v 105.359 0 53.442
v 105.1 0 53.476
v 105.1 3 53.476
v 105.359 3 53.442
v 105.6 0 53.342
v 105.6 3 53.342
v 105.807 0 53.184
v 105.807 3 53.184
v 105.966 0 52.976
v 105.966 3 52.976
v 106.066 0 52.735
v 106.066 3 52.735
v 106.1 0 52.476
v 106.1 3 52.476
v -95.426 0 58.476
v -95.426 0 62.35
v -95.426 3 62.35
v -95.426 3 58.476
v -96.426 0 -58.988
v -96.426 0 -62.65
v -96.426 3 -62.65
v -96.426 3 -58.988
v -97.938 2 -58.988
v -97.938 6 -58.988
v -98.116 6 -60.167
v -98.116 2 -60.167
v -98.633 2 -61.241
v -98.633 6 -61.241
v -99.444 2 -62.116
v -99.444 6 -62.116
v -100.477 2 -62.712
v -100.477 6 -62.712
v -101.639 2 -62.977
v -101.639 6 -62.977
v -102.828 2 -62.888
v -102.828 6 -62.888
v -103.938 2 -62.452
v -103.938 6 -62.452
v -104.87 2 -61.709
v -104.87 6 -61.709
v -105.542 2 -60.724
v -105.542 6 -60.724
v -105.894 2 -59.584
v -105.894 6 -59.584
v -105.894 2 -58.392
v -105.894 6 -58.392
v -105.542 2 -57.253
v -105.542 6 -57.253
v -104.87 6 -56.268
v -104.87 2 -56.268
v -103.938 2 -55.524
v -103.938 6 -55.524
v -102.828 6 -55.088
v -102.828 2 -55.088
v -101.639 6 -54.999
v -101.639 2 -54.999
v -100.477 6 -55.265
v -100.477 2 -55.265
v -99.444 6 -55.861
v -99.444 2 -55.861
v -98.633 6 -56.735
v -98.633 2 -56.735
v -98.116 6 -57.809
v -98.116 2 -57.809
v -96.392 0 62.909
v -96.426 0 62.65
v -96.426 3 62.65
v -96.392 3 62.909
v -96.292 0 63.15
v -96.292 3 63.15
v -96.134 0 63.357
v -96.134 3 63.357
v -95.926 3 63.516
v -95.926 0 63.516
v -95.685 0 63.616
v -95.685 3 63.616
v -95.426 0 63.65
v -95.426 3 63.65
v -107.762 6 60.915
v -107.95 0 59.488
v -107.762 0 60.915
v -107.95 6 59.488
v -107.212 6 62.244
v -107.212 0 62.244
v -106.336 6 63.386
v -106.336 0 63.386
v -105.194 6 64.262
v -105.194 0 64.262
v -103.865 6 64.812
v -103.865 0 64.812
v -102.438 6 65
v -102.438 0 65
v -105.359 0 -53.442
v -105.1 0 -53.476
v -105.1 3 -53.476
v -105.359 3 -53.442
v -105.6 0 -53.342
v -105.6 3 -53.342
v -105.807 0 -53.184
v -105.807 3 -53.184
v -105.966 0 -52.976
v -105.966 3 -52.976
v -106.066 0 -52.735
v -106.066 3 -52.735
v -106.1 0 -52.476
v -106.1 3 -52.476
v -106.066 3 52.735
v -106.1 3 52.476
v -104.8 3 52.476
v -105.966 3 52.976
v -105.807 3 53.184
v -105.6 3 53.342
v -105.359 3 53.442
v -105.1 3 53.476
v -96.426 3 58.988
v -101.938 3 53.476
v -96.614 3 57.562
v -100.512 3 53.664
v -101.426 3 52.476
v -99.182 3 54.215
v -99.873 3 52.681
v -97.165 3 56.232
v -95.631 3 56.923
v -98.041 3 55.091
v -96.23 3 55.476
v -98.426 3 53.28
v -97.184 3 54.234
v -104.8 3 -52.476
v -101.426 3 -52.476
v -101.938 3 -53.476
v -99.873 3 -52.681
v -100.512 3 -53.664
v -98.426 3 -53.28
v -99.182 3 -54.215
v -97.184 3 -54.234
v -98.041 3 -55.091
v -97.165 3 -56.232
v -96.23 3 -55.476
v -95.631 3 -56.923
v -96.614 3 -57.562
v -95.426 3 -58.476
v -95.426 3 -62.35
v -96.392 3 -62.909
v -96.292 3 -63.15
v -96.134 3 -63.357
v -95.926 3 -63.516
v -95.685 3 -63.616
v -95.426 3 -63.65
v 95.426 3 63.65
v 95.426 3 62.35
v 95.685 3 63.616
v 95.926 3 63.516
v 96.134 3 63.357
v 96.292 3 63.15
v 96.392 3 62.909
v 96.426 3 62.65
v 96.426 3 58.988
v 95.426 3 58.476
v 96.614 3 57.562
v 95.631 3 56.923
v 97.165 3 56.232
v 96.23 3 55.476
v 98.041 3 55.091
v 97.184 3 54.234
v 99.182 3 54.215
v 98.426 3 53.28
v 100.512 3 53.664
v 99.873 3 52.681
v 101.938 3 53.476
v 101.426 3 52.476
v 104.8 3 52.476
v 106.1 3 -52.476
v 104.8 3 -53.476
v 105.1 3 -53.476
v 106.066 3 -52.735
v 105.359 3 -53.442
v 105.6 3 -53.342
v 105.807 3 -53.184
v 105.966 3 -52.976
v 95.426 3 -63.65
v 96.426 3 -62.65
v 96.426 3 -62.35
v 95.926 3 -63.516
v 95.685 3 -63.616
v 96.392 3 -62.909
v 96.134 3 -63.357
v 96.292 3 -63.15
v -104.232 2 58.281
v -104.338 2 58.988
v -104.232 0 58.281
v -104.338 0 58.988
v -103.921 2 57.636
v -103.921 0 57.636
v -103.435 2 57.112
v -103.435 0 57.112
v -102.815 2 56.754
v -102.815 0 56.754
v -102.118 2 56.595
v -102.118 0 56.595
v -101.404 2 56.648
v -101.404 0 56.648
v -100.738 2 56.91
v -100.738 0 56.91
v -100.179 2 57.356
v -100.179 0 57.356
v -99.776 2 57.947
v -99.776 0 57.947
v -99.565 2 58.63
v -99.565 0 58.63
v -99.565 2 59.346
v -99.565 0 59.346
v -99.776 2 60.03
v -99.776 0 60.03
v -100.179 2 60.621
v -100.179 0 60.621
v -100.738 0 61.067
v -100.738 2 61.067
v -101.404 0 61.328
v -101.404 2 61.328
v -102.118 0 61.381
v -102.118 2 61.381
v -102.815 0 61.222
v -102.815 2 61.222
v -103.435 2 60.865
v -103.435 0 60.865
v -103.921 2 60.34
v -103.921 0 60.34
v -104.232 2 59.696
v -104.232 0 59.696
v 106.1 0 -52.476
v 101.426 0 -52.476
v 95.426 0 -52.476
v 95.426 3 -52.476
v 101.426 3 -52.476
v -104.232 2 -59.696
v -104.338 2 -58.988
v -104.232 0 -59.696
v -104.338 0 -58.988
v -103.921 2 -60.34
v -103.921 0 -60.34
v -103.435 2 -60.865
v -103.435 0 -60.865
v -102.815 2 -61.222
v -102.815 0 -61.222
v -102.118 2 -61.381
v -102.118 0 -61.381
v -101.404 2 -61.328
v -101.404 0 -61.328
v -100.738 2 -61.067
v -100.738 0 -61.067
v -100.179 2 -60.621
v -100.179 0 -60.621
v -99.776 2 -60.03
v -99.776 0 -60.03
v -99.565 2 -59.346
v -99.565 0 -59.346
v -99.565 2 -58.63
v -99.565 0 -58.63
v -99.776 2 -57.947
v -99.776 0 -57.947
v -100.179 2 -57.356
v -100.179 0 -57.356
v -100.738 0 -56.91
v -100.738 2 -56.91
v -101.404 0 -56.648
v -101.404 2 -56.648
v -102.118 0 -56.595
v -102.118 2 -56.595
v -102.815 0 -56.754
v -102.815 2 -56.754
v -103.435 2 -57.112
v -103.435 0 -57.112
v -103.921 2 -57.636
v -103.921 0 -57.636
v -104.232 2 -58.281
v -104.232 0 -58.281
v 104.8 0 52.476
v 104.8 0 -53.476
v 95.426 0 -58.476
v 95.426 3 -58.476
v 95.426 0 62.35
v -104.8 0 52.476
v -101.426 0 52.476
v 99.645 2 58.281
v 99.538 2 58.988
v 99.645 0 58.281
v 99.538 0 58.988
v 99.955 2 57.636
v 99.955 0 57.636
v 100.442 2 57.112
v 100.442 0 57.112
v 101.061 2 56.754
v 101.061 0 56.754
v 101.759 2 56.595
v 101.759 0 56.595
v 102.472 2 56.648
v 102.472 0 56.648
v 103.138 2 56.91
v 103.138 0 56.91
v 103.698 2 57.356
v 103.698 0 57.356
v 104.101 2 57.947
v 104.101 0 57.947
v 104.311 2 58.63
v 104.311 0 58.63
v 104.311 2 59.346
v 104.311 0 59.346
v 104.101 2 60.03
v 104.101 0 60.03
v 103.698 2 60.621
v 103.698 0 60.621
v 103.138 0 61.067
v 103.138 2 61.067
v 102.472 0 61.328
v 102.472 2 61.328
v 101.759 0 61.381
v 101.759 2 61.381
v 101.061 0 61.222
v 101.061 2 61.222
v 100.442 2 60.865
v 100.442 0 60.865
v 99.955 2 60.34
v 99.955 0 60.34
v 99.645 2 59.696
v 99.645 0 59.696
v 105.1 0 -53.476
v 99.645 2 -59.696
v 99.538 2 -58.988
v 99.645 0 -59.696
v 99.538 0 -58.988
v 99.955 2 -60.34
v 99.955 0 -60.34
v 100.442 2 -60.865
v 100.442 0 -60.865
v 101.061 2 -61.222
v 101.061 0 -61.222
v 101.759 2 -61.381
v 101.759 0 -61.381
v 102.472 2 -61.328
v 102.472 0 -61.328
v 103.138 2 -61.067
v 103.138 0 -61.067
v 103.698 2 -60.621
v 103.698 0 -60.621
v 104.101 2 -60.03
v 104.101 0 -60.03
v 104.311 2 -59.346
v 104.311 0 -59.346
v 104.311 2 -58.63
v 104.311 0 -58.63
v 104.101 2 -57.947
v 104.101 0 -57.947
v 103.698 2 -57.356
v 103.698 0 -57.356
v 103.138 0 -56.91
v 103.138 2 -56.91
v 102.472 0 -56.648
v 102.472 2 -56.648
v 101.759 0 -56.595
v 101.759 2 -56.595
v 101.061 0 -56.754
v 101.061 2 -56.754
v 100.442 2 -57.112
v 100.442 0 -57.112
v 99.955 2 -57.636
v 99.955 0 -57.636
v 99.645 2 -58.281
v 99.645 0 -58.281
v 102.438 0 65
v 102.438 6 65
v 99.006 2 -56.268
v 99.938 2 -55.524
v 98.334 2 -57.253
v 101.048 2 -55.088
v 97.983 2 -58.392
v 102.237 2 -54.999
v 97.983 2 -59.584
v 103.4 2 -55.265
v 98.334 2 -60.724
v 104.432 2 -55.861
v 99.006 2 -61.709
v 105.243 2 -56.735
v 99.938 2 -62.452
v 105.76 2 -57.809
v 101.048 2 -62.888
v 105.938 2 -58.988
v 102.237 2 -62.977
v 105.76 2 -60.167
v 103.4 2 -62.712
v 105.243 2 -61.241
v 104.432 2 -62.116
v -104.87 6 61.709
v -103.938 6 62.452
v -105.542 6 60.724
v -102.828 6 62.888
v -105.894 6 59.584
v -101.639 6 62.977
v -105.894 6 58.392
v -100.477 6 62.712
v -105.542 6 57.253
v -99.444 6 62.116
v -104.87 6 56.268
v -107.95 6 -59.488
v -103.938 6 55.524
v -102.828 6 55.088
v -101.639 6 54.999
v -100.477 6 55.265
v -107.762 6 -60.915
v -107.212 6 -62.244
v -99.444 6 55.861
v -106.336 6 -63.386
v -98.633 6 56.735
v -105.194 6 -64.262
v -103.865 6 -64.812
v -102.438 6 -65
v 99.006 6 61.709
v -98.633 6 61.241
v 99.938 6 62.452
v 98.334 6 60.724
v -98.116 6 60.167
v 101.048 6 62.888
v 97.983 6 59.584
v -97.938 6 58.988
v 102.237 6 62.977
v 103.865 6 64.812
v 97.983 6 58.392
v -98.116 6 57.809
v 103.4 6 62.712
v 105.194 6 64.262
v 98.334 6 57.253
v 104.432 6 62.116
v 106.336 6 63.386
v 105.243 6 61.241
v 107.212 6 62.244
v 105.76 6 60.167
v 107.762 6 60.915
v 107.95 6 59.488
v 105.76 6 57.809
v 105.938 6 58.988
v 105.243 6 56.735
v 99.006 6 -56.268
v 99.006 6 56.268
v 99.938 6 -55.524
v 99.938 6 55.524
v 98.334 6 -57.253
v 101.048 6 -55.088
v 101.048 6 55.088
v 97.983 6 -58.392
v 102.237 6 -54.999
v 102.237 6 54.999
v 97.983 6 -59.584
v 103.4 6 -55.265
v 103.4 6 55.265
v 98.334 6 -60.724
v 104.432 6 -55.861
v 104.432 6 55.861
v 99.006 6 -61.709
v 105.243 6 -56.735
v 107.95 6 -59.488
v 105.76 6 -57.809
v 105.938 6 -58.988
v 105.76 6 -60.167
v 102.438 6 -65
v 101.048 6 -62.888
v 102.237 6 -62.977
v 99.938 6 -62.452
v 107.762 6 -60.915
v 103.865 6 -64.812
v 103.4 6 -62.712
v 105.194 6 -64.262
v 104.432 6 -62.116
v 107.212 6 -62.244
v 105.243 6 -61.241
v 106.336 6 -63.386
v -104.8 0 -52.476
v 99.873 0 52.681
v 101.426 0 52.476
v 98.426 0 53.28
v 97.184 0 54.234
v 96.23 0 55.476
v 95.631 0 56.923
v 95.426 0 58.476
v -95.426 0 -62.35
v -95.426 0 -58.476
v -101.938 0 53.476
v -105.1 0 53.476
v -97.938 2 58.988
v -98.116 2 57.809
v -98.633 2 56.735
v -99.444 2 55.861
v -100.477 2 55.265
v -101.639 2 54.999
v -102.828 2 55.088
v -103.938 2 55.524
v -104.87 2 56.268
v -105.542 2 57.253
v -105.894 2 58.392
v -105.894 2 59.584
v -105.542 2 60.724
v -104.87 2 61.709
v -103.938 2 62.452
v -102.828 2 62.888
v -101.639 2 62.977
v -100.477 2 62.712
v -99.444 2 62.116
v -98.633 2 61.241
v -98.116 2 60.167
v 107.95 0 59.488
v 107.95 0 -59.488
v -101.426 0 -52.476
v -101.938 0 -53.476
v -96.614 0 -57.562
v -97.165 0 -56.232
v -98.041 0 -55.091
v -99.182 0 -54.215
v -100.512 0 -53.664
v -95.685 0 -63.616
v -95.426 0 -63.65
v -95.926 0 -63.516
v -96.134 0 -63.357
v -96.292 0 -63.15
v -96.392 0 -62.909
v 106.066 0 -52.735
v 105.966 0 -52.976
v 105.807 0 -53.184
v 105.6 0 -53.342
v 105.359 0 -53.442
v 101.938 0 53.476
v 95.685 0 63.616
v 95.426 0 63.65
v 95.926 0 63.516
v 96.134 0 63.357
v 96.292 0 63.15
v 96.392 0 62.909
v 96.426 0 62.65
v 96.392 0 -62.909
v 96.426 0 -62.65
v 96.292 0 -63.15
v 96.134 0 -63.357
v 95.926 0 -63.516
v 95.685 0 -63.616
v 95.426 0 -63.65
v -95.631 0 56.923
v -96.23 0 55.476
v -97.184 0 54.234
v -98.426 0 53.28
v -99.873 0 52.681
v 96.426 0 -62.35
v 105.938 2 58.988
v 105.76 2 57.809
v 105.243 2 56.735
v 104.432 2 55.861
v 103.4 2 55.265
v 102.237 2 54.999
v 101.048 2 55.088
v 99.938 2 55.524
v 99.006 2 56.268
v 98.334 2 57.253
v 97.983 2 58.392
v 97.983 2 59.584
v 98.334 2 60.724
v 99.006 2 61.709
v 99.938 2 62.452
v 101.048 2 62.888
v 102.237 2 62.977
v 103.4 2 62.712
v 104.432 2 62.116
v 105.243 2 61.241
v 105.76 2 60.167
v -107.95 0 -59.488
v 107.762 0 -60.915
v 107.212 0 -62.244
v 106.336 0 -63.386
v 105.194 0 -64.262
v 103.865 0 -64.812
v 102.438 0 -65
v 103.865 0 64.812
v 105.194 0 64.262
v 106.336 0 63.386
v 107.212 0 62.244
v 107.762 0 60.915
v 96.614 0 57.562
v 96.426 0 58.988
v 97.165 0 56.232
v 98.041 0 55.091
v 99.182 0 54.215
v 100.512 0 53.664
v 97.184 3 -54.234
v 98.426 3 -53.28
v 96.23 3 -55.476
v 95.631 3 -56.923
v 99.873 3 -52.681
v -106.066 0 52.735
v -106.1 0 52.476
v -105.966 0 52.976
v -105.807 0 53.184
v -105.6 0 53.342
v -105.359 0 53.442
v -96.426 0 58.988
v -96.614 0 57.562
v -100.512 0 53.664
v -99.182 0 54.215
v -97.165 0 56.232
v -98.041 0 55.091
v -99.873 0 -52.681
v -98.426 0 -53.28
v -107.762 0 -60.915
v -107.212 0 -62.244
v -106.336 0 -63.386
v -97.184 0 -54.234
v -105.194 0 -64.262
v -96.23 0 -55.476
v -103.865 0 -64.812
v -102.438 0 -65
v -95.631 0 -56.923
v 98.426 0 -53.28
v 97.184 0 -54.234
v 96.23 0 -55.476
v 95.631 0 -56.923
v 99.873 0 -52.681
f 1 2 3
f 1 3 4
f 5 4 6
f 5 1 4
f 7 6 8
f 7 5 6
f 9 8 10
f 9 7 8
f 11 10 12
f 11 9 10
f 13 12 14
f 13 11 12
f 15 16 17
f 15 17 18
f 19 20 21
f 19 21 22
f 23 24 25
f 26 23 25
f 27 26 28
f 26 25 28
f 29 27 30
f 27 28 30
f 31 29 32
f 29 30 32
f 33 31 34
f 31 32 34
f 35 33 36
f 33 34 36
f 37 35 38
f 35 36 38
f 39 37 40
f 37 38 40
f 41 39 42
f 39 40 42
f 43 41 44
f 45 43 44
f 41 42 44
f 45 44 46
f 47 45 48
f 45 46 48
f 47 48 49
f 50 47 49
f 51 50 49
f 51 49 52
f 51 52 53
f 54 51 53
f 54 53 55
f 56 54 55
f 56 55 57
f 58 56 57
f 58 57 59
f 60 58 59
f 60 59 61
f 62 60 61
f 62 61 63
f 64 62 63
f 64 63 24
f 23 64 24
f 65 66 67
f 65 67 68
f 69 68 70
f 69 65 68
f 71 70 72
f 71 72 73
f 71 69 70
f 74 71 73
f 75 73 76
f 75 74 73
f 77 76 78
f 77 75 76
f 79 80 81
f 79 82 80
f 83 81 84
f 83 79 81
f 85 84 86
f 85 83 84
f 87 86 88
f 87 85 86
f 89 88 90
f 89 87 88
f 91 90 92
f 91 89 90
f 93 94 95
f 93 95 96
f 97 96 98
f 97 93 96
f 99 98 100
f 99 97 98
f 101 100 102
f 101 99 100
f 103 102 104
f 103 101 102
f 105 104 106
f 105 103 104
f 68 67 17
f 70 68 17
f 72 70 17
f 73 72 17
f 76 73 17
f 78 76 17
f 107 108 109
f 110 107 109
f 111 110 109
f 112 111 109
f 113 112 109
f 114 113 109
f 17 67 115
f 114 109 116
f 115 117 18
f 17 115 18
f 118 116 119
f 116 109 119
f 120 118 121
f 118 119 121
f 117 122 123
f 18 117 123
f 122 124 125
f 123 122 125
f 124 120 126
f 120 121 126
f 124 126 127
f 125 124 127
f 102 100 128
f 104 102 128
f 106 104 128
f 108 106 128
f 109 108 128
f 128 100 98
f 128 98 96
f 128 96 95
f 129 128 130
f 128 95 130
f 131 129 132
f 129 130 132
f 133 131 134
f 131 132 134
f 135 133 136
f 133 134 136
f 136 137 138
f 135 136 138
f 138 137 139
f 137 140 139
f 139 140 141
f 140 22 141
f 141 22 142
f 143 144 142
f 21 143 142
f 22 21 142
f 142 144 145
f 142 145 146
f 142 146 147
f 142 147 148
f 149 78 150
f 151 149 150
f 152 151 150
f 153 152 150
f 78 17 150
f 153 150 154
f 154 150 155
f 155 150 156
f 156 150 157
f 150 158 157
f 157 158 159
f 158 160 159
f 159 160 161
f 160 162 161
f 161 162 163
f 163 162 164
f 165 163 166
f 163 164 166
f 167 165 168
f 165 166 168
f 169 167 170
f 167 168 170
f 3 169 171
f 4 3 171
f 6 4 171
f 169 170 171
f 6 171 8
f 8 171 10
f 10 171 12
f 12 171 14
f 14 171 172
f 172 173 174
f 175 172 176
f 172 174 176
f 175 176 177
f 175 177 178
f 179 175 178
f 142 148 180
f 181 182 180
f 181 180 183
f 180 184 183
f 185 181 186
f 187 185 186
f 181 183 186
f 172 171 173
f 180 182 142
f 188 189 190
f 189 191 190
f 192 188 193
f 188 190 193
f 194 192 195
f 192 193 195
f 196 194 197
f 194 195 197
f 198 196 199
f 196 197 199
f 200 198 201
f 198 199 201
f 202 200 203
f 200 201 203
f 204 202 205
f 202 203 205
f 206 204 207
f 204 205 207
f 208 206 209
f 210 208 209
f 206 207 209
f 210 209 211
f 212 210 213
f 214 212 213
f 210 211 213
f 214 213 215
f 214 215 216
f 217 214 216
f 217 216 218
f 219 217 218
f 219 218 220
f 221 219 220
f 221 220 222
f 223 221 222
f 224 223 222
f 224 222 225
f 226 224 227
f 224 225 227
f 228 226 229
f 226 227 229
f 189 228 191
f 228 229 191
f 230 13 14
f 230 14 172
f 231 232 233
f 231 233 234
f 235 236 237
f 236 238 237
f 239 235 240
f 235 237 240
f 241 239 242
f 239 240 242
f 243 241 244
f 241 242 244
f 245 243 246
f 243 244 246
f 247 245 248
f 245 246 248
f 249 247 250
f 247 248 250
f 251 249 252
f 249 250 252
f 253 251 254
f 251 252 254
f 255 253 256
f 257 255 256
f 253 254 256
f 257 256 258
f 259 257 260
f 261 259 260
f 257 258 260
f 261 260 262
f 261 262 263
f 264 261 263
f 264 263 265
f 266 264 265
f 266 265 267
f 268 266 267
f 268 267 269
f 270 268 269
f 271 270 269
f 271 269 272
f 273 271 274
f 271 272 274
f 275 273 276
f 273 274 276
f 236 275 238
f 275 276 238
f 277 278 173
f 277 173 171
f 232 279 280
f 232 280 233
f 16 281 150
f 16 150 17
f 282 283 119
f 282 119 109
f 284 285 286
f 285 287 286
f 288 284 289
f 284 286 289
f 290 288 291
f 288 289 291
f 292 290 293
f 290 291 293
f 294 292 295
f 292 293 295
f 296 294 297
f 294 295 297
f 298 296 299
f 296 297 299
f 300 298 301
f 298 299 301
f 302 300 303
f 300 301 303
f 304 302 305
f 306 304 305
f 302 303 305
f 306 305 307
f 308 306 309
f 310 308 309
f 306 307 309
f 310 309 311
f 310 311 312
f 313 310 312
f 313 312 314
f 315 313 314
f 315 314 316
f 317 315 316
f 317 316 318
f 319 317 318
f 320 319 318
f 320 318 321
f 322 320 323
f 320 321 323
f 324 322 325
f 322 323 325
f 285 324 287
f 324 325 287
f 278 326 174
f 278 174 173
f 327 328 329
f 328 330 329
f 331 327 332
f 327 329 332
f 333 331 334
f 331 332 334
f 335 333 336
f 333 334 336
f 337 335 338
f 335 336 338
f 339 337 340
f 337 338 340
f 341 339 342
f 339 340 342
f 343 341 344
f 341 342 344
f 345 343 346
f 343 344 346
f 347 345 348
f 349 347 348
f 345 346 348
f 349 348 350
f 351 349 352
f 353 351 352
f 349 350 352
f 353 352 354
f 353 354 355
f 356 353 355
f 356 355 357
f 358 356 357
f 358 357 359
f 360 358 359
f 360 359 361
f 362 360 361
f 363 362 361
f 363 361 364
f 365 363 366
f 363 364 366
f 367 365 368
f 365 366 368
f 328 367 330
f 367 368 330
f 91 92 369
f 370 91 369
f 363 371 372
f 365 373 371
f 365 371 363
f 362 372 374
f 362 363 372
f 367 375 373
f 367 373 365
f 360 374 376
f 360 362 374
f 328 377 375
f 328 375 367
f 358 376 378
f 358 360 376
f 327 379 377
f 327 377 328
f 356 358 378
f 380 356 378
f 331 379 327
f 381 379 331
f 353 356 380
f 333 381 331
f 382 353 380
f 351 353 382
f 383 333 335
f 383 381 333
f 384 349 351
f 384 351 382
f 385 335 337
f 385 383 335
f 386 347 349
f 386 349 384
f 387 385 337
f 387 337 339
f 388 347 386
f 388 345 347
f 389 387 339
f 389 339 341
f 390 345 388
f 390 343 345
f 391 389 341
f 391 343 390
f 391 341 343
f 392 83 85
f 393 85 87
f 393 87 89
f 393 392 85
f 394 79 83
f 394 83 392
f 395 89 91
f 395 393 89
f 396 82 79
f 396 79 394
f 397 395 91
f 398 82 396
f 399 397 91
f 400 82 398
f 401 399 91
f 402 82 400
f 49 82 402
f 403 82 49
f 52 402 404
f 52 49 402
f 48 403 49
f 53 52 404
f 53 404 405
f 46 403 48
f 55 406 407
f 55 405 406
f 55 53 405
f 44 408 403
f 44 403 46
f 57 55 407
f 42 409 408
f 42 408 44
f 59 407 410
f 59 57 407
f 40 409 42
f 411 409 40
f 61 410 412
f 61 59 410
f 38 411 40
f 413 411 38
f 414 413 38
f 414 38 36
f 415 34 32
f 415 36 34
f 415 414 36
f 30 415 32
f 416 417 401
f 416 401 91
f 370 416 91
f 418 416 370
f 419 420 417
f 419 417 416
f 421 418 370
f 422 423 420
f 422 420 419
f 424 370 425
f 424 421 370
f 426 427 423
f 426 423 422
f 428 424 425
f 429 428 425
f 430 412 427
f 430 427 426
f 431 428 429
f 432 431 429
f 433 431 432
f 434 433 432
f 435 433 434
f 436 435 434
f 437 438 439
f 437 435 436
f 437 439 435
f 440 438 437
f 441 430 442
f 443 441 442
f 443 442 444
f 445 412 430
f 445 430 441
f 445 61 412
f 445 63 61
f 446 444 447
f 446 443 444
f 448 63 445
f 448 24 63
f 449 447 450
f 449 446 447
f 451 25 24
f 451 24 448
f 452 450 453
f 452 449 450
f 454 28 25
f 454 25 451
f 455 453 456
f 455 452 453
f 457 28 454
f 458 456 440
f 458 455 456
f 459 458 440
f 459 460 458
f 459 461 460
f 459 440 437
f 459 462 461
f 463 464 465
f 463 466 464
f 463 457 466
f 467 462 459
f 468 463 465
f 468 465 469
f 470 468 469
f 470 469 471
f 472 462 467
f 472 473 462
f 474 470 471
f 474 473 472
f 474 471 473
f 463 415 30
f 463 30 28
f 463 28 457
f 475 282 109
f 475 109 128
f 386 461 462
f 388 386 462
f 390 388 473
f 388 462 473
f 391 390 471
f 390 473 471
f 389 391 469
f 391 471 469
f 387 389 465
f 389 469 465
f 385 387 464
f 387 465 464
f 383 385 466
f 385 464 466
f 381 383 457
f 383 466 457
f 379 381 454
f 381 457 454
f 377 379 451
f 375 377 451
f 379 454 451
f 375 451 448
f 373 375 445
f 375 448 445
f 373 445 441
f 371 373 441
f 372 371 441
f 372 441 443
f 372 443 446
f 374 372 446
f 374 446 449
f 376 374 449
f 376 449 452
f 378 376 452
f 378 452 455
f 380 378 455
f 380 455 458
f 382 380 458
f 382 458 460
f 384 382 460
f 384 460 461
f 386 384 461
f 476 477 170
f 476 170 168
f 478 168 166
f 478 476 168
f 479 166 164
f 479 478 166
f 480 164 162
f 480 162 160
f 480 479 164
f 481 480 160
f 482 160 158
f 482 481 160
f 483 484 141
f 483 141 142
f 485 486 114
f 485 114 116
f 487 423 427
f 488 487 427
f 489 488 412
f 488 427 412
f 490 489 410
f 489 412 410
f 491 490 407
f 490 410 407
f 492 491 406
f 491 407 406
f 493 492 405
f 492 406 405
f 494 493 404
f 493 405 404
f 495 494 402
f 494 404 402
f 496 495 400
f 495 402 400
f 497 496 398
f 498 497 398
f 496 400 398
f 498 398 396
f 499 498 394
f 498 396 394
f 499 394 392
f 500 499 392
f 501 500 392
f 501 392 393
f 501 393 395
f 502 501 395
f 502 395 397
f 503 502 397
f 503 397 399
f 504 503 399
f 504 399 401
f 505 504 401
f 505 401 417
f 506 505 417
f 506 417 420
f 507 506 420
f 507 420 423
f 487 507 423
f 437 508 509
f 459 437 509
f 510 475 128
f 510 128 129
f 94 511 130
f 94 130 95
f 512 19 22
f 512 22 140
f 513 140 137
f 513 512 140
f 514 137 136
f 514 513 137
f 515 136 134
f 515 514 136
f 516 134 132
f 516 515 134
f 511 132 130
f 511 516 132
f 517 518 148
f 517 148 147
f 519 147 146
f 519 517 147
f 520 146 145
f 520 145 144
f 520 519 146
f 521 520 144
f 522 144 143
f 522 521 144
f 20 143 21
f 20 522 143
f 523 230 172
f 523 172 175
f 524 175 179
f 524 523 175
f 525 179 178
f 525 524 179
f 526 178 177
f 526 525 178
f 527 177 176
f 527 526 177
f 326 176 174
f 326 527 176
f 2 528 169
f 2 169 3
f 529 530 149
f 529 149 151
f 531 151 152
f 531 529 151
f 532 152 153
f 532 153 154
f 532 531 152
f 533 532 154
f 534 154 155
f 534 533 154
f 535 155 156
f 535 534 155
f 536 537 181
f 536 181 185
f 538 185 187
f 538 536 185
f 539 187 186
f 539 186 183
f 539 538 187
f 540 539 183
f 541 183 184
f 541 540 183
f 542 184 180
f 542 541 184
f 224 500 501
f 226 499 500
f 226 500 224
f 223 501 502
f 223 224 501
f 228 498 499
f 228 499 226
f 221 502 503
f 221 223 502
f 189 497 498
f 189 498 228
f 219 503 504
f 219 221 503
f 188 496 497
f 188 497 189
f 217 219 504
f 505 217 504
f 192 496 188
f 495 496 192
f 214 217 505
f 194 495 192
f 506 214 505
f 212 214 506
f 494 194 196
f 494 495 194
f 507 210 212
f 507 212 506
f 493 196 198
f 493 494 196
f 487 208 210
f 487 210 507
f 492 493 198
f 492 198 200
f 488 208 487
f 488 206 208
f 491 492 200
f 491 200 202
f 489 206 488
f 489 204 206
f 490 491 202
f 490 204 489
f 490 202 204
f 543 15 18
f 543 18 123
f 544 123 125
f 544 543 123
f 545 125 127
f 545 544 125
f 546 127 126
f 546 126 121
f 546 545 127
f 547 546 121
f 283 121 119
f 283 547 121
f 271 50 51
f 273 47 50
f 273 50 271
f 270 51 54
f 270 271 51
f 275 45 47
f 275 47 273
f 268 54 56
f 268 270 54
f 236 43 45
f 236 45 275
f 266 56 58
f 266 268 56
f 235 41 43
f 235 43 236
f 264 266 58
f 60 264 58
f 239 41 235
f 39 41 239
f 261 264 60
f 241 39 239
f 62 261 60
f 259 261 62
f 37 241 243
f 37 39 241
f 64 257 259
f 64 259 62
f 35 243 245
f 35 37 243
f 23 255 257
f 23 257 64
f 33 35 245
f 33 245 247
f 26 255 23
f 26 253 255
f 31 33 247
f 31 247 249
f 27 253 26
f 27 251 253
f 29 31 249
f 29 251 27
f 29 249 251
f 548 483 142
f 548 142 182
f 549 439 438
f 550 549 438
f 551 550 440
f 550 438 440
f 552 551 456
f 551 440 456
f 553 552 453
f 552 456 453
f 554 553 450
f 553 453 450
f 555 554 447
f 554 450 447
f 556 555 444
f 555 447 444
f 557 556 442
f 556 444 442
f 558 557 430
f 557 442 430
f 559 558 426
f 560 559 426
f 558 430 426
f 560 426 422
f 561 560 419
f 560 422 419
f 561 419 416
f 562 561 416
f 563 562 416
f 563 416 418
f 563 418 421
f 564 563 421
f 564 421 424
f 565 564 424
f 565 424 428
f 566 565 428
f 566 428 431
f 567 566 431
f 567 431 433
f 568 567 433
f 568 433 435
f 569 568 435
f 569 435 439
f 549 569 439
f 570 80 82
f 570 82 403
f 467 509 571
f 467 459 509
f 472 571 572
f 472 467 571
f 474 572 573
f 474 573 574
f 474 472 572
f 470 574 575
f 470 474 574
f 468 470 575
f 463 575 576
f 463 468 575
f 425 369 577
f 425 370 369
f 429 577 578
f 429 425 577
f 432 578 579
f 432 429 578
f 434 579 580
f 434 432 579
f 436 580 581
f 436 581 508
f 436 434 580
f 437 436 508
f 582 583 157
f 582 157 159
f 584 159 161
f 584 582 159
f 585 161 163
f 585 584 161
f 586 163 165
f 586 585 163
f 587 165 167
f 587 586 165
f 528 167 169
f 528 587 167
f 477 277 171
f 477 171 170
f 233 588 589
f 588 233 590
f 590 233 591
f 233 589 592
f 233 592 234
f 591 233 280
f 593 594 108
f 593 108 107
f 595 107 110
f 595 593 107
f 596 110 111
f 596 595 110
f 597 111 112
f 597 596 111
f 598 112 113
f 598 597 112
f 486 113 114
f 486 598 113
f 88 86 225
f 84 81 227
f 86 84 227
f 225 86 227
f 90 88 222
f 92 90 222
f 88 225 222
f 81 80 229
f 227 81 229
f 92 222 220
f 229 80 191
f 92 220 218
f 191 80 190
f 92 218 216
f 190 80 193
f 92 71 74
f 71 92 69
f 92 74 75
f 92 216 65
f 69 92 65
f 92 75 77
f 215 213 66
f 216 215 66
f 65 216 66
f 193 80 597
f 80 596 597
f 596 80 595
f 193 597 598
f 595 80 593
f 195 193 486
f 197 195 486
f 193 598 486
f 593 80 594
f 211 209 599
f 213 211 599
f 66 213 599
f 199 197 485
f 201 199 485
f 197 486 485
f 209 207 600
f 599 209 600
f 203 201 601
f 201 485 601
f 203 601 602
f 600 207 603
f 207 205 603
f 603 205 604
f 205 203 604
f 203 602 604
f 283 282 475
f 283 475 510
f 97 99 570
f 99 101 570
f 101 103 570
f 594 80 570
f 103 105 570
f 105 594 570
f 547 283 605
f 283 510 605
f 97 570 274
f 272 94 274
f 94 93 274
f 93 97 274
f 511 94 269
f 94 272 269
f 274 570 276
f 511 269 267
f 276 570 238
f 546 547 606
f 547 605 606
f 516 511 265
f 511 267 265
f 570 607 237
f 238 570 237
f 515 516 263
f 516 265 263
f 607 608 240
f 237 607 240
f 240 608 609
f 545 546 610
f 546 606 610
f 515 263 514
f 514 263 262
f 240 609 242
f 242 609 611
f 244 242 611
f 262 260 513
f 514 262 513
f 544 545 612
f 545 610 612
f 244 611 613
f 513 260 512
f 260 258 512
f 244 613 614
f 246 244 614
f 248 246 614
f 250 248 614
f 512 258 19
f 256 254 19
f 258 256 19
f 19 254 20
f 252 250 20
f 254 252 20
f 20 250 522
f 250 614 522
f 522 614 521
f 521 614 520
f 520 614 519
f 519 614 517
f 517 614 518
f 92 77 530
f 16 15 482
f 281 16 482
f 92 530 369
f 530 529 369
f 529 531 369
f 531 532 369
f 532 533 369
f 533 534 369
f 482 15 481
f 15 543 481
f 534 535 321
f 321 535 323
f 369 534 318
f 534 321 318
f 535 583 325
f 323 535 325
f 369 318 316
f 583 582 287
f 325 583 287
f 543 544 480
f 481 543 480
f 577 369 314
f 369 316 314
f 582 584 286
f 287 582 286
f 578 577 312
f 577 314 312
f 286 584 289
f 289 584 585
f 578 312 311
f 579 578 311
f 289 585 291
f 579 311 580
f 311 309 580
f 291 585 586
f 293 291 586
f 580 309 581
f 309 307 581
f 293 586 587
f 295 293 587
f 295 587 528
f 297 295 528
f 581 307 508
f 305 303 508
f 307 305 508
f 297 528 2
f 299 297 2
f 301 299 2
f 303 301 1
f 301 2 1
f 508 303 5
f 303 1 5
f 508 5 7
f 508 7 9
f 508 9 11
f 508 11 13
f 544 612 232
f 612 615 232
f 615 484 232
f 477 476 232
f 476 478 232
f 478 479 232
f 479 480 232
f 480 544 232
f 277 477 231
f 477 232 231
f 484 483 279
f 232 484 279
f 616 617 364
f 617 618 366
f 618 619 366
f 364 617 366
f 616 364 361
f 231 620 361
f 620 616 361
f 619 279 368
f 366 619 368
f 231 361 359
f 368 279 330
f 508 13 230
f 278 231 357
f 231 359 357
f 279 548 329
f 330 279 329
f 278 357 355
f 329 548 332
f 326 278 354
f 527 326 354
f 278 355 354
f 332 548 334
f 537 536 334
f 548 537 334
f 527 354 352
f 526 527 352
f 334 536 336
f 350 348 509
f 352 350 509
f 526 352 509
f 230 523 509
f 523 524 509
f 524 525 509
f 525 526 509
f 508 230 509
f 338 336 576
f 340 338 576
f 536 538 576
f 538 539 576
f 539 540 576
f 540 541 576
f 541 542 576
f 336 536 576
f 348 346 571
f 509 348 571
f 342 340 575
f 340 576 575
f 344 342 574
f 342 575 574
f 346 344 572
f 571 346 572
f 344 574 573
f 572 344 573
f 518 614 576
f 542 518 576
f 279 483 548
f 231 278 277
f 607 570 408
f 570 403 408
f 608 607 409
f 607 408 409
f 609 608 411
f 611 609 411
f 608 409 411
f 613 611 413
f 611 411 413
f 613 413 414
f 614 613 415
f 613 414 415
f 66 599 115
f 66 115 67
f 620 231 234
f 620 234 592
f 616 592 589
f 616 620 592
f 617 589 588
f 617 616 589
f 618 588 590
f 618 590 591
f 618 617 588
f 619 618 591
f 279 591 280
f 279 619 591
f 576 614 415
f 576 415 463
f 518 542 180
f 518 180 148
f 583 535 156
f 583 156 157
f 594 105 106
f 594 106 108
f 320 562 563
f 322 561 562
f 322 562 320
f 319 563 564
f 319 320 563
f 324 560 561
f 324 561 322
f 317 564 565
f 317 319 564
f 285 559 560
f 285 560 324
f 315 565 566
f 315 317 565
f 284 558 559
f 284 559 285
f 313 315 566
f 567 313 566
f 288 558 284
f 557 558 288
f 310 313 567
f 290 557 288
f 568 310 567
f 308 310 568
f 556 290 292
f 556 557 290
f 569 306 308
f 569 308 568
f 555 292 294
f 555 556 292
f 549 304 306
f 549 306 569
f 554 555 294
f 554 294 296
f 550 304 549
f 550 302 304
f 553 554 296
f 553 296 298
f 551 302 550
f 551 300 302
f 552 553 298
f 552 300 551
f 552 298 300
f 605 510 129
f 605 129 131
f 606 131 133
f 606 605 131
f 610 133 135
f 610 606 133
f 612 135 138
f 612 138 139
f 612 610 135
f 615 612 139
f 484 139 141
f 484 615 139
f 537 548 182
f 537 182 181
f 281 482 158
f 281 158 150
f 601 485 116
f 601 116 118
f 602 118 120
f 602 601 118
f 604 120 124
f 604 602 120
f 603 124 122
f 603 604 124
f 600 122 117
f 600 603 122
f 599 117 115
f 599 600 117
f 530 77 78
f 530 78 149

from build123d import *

# Parameters (mm, degrees)
SKETCH1_W                      = 215.9
SKETCH1_H                      = 130
BOSS_EXTRUDE1_DEPTH            = 6
FILLET1_R                      = 5.5118
CAVITY3_DEPTH                  = 3
CBORE_FOR_M4_SHCS1_D           = 4.8
CBORE_FOR_M4_SHCS1_CBORE_D     = 8
CBORE_FOR_M4_SHCS1_CBORE_DEPTH = 4


# Read off the part's stored shape, not the designer's step: Cavity3
with BuildPart() as part:
    # Sketch1 → Boss-Extrude1 (new body)
    with BuildSketch(Plane(origin=(0, 0, 0), x_dir=(1, 0, 0), z_dir=(0, 1, 0))):
        Rectangle(SKETCH1_W, SKETCH1_H)
    extrude(amount=BOSS_EXTRUDE1_DEPTH)

    # Fillet1
    fillet1_edges = [part.edges().sort_by_distance(p)[0] for p in [
        (107.95, 3, 65),
        (-107.95, 3, 65),
        (-107.95, 3, -65),
        (107.95, 3, -65),
    ]]
    fillet(fillet1_edges, radius=FILLET1_R)

    # Cavity3 outline → Cavity3 (cut)
    with BuildSketch(Plane(origin=(0, 0, 0), x_dir=(1, 0, 0), z_dir=(0, 1, 0))):
        with BuildLine():
            ThreePointArc((-106.1, -52.4764), (-105.807106781, -53.183506781), (-105.1, -53.4764))
            Line((-105.1, -53.4764), (-101.9382, -53.4764))
            ThreePointArc((-101.9382, -53.4764), (-98.040768843, -55.090768843), (-96.4264, -58.9882))
            Line((-96.4264, -58.9882), (-96.4264, -62.65))
            ThreePointArc((-96.4264, -62.65), (-96.133506781, -63.357106781), (-95.4264, -63.65))
            Line((-95.4264, -63.65), (95.4264, -63.65))
            ThreePointArc((95.4264, -63.65), (96.133506781, -63.357106781), (96.4264, -62.65))
            Line((96.4264, -62.65), (96.4264, -58.9882))
            ThreePointArc((96.4264, -58.9882), (98.040768843, -55.090768843), (101.9382, -53.4764))
            Line((101.9382, -53.4764), (105.1, -53.4764))
            ThreePointArc((105.1, -53.4764), (105.807106781, -53.183506781), (106.1, -52.4764))
            Line((106.1, -52.4764), (106.1, 52.4764))
            ThreePointArc((106.1, 52.4764), (105.807106781, 53.183506781), (105.1, 53.4764))
            Line((105.1, 53.4764), (104.8, 53.4764))
            Line((104.8, 53.4764), (104.8, -52.4764))
            Line((104.8, -52.4764), (101.4264, -52.4764))
            ThreePointArc((101.4264, -52.4764), (97.183759313, -54.233759313), (95.4264, -58.4764))
            Line((95.4264, -58.4764), (95.4264, -62.35))
            Line((95.4264, -62.35), (-95.4264, -62.35))
            Line((-95.4264, -62.35), (-95.4264, -58.4764))
            ThreePointArc((-95.4264, -58.4764), (-97.183759313, -54.233759313), (-101.4264, -52.4764))
            Line((-101.4264, -52.4764), (-104.8, -52.4764))
            Line((-104.8, -52.4764), (-104.8, 52.4764))
            Line((-104.8, 52.4764), (-101.4264, 52.4764))
            ThreePointArc((-101.4264, 52.4764), (-97.183759313, 54.233759313), (-95.4264, 58.4764))
            Line((-95.4264, 58.4764), (-95.4264, 62.35))
            Line((-95.4264, 62.35), (96.4264, 62.35))
            Line((96.4264, 62.35), (96.4264, 62.65))
            ThreePointArc((96.4264, 62.65), (96.133506781, 63.357106781), (95.4264, 63.65))
            Line((95.4264, 63.65), (-95.4264, 63.65))
            ThreePointArc((-95.4264, 63.65), (-96.133506781, 63.357106781), (-96.4264, 62.65))
            Line((-96.4264, 62.65), (-96.4264, 58.9882))
            ThreePointArc((-96.4264, 58.9882), (-98.040768843, 55.090768843), (-101.9382, 53.4764))
            Line((-101.9382, 53.4764), (-105.1, 53.4764))
            ThreePointArc((-105.1, 53.4764), (-105.807106781, 53.183506781), (-106.1, 52.4764))
            Line((-106.1, 52.4764), (-106.1, -52.4764))
        make_face()
        with BuildLine():
            Line((95.4264, 52.4764), (101.4264, 52.4764))
            ThreePointArc((101.4264, 52.4764), (97.183759313, 54.233759313), (95.4264, 58.4764))
            Line((95.4264, 58.4764), (95.4264, 52.4764))
        make_face()
    extrude(amount=CAVITY3_DEPTH, mode=Mode.SUBTRACT)

    # CBORE for M4 SHCS1 (through all)
    with Locations(Plane(origin=(0, 6, 0), x_dir=(1, 0, 0), z_dir=(0, 1, 0))):
        with Locations((-101.9382, 58.9882), (-101.9382, -58.9882), (101.9382, -58.9882), (101.9382, 58.9882)):
            CounterBoreHole(CBORE_FOR_M4_SHCS1_D / 2, CBORE_FOR_M4_SHCS1_CBORE_D / 2, CBORE_FOR_M4_SHCS1_CBORE_DEPTH)


solid = part.part
